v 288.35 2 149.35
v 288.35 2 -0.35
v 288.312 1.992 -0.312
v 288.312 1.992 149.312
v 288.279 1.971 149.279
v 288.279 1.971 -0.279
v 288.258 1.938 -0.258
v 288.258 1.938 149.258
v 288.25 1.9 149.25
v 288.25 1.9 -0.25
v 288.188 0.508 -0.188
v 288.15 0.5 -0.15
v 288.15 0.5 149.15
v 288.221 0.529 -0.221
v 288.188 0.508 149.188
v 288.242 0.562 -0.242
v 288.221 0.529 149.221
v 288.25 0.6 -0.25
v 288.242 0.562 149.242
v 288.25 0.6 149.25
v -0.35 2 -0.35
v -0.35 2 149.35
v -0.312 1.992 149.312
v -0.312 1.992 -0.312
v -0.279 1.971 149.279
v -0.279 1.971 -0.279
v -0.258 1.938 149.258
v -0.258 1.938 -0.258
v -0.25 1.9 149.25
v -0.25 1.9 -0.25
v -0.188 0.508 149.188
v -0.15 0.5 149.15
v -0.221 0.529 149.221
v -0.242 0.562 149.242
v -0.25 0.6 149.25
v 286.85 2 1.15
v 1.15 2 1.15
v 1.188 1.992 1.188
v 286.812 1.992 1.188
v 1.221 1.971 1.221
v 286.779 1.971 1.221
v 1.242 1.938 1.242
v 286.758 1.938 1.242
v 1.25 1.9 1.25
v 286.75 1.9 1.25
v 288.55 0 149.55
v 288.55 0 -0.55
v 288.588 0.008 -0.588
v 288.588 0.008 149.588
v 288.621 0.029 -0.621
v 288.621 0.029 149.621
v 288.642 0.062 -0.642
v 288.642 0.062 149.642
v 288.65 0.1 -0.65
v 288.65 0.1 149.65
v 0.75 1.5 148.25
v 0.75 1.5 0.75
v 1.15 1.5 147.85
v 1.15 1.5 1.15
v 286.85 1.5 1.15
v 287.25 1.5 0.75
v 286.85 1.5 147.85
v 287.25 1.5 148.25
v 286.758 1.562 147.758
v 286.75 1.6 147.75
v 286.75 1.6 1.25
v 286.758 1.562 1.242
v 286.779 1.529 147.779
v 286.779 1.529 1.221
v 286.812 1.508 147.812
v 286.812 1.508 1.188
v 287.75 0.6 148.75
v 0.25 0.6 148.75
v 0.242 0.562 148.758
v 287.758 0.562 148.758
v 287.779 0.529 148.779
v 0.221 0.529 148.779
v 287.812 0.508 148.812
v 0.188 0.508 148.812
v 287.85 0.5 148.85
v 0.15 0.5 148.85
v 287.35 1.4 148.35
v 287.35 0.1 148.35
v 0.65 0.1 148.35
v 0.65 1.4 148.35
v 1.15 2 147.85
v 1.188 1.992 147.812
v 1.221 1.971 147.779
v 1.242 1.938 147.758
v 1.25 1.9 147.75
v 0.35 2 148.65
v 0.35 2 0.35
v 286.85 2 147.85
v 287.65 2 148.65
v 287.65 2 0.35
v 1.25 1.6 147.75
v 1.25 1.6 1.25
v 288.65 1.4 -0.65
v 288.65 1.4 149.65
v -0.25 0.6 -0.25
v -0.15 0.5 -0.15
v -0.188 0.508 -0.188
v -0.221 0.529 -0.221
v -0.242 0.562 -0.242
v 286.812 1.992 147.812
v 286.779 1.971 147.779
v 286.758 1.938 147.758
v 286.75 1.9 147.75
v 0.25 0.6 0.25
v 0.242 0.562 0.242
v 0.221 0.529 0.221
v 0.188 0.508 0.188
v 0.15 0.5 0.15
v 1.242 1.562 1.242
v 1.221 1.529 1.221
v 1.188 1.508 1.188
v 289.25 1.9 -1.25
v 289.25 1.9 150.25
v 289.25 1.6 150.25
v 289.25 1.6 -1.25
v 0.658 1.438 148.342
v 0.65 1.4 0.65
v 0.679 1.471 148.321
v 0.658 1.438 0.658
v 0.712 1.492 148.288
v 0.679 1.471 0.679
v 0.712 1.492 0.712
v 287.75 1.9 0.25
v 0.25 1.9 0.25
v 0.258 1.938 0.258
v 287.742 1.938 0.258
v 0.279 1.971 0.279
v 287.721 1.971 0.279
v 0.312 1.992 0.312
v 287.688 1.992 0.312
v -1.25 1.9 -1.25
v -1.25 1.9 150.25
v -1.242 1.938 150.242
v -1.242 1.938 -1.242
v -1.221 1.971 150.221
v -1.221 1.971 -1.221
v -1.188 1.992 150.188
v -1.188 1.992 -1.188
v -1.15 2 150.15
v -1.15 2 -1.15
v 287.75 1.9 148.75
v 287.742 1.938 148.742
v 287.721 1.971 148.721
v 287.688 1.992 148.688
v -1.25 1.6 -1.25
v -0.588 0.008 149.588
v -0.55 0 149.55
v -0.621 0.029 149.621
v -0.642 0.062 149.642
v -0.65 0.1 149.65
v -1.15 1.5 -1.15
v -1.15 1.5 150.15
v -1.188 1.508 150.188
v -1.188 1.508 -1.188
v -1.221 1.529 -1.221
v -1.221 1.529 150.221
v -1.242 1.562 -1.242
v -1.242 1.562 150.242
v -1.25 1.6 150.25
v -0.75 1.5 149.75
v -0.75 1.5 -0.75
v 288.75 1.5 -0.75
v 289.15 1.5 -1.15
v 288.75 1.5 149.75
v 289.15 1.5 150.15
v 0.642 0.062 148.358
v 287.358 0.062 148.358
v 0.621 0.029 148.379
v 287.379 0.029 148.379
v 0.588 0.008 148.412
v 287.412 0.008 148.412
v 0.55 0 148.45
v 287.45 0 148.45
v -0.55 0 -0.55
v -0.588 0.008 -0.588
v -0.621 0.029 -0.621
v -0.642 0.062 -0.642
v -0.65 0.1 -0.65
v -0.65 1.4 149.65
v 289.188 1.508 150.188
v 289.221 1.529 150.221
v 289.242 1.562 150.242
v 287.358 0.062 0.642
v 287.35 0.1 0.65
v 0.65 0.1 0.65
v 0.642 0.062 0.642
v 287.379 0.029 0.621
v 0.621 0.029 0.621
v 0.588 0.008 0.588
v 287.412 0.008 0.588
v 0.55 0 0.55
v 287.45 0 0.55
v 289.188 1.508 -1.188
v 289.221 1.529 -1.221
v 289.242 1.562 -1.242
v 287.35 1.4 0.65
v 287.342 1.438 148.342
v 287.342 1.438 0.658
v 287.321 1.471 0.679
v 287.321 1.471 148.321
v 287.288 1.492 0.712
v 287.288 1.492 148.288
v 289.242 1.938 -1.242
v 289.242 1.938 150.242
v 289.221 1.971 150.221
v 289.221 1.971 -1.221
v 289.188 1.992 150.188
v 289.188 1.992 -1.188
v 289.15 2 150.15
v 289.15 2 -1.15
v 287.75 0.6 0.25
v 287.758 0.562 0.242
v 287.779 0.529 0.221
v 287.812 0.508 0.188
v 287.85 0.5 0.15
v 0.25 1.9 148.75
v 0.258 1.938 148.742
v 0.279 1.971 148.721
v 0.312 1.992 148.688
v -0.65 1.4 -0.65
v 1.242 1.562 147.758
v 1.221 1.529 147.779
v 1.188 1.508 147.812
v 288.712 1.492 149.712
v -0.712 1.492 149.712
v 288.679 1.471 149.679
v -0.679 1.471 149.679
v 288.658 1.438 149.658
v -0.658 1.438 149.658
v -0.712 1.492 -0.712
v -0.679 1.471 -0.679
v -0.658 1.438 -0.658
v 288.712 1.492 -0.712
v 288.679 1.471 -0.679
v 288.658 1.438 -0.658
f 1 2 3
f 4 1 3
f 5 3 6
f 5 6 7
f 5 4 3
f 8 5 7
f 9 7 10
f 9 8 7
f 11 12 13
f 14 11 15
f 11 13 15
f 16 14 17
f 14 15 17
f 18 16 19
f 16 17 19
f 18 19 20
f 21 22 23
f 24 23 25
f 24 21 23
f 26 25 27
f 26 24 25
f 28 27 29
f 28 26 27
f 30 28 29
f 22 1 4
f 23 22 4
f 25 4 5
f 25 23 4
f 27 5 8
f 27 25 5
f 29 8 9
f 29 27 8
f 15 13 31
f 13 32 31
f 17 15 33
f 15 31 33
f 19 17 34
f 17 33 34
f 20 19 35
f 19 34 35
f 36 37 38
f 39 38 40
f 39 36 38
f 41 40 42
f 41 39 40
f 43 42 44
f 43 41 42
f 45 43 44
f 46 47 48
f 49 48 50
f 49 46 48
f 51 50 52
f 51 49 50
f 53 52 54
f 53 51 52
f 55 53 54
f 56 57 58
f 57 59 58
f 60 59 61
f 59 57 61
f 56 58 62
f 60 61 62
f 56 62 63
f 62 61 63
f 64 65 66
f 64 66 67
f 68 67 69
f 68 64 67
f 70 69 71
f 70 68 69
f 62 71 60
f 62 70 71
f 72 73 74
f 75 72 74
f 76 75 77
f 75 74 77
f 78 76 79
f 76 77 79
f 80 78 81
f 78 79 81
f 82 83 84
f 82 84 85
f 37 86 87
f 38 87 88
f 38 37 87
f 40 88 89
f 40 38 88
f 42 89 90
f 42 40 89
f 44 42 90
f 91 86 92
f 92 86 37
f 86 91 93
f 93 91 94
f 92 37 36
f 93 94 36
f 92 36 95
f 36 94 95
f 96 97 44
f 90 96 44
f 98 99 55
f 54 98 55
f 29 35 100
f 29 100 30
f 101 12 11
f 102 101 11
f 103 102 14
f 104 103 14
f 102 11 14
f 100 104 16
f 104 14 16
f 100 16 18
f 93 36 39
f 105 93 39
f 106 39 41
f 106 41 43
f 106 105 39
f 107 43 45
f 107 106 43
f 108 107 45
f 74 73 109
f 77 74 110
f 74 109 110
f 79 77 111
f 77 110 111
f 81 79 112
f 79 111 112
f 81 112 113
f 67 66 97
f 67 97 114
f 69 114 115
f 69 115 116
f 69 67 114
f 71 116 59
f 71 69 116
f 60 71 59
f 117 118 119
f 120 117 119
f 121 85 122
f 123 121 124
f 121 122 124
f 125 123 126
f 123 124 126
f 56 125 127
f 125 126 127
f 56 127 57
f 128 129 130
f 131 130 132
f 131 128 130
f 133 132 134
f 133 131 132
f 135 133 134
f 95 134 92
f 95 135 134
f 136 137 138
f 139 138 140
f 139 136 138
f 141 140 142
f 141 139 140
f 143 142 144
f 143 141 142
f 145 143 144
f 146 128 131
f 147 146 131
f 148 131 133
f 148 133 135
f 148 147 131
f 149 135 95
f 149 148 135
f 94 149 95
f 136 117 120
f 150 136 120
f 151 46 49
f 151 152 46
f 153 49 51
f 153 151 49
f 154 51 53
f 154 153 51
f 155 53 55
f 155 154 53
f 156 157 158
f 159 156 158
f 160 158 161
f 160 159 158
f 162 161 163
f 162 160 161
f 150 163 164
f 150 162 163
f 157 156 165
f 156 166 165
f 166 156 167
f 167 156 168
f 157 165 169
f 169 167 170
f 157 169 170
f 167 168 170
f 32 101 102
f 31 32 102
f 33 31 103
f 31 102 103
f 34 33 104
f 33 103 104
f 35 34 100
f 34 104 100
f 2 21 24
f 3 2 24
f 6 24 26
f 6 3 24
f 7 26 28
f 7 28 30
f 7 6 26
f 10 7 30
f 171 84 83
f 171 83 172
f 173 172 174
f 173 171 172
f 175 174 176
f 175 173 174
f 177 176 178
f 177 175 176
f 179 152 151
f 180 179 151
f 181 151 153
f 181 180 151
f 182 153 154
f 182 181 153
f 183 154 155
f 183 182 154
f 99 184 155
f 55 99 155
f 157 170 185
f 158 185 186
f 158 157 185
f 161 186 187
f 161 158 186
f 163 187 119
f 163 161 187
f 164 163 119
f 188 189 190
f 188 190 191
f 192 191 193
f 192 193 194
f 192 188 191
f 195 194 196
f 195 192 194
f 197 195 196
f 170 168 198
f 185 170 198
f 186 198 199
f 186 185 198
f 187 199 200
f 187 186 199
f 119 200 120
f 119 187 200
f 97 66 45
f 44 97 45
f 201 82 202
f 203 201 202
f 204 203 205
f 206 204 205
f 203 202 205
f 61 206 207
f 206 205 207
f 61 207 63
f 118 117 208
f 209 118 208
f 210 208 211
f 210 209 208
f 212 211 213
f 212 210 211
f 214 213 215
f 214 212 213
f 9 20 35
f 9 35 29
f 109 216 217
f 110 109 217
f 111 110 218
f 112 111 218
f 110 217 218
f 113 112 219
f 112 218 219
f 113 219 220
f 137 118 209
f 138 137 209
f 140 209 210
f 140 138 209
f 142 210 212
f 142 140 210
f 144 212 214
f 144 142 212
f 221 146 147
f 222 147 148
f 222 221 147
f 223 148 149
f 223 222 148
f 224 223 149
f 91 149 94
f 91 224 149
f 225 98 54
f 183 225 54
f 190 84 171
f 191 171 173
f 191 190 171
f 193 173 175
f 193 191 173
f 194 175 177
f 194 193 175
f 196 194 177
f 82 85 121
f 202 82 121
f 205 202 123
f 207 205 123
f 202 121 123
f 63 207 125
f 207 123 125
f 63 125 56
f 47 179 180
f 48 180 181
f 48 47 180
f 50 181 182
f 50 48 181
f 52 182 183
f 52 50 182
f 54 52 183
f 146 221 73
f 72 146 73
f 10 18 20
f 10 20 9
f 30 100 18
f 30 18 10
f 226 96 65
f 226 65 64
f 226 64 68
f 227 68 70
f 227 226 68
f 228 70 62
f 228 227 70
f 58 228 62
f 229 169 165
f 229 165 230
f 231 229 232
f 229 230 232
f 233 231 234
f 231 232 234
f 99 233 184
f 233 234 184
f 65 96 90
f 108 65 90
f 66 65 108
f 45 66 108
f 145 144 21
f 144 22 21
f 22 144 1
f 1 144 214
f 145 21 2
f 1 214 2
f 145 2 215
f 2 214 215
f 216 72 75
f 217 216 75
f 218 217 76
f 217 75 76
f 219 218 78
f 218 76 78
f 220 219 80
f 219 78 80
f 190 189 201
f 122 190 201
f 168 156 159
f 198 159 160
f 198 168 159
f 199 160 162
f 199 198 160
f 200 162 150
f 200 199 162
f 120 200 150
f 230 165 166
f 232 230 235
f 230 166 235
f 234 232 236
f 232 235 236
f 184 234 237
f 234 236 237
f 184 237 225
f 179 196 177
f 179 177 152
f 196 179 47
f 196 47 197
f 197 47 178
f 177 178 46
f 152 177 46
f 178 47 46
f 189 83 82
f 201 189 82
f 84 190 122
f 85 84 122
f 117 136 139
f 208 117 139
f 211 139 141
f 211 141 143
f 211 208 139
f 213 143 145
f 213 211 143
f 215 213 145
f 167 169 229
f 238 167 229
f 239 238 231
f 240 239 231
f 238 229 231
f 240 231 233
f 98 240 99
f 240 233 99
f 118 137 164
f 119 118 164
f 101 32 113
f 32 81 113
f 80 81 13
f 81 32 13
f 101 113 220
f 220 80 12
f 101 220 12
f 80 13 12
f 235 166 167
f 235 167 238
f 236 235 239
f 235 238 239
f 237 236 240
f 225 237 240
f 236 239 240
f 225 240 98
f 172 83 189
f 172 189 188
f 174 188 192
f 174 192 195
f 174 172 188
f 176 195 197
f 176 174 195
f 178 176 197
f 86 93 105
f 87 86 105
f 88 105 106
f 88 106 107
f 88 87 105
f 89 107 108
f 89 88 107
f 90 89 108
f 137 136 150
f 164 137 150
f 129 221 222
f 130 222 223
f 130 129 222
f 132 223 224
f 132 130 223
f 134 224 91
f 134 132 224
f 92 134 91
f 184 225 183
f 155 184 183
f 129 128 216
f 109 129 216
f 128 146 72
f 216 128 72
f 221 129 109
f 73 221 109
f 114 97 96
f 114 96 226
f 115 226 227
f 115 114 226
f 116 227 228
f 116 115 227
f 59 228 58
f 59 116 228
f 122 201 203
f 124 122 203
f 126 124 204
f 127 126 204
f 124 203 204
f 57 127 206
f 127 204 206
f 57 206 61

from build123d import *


with BuildPart() as part:
    # Sweep1: sweep along a path in Sketch1
    with BuildLine(Plane(origin=(0, 0, 0), x_dir=(1, 0, 0), z_dir=(0, 1, 0))) as sweep1_path:
        Line((0, 0), (288, 0))
        Line((288, 0), (288, -149))
        Line((288, -149), (0, -149))
        Line((0, -149), (0, 0))
    # Sketch2 → Sweep1 (sweep)
    with BuildSketch(Plane(origin=(144, 0, 0), x_dir=(0, 0, -1), z_dir=(1, 0, 0))):
        with BuildLine():
            Line((-147.85, 2), (-148.65, 2))
            ThreePointArc((-148.65, 2), (-148.720710678, 1.970710678), (-148.75, 1.9))
            Line((-148.75, 1.9), (-148.75, 0.6))
            ThreePointArc((-148.75, 0.6), (-148.779289322, 0.529289322), (-148.85, 0.5))
            Line((-148.85, 0.5), (-149.15, 0.5))
            ThreePointArc((-149.15, 0.5), (-149.220710678, 0.529289322), (-149.25, 0.6))
            Line((-149.25, 0.6), (-149.25, 1.9))
            ThreePointArc((-149.25, 1.9), (-149.279289322, 1.970710678), (-149.35, 2))
            Line((-149.35, 2), (-150.15, 2))
            ThreePointArc((-150.15, 2), (-150.220710678, 1.970710678), (-150.25, 1.9))
            Line((-150.25, 1.9), (-150.25, 1.6))
            ThreePointArc((-150.25, 1.6), (-150.220710678, 1.529289322), (-150.15, 1.5))
            Line((-150.15, 1.5), (-149.75, 1.5))
            ThreePointArc((-149.75, 1.5), (-149.679289322, 1.470710678), (-149.65, 1.4))
            Line((-149.65, 1.4), (-149.65, 0.1))
            ThreePointArc((-149.65, 0.1), (-149.620710678, 0.029289322), (-149.55, 0))
            Line((-149.55, 0), (-148.45, 0))
            ThreePointArc((-148.45, 0), (-148.379289322, 0.029289322), (-148.35, 0.1))
            Line((-148.35, 0.1), (-148.35, 1.4))
            ThreePointArc((-148.35, 1.4), (-148.320710678, 1.470710678), (-148.25, 1.5))
            Line((-148.25, 1.5), (-147.85, 1.5))
            ThreePointArc((-147.85, 1.5), (-147.779289322, 1.529289322), (-147.75, 1.6))
            Line((-147.75, 1.6), (-147.75, 1.9))
            ThreePointArc((-147.75, 1.9), (-147.779289322, 1.970710678), (-147.85, 2))
        make_face()
    sweep(path=sweep1_path.line, transition=Transition.RIGHT)


solid = part.part
